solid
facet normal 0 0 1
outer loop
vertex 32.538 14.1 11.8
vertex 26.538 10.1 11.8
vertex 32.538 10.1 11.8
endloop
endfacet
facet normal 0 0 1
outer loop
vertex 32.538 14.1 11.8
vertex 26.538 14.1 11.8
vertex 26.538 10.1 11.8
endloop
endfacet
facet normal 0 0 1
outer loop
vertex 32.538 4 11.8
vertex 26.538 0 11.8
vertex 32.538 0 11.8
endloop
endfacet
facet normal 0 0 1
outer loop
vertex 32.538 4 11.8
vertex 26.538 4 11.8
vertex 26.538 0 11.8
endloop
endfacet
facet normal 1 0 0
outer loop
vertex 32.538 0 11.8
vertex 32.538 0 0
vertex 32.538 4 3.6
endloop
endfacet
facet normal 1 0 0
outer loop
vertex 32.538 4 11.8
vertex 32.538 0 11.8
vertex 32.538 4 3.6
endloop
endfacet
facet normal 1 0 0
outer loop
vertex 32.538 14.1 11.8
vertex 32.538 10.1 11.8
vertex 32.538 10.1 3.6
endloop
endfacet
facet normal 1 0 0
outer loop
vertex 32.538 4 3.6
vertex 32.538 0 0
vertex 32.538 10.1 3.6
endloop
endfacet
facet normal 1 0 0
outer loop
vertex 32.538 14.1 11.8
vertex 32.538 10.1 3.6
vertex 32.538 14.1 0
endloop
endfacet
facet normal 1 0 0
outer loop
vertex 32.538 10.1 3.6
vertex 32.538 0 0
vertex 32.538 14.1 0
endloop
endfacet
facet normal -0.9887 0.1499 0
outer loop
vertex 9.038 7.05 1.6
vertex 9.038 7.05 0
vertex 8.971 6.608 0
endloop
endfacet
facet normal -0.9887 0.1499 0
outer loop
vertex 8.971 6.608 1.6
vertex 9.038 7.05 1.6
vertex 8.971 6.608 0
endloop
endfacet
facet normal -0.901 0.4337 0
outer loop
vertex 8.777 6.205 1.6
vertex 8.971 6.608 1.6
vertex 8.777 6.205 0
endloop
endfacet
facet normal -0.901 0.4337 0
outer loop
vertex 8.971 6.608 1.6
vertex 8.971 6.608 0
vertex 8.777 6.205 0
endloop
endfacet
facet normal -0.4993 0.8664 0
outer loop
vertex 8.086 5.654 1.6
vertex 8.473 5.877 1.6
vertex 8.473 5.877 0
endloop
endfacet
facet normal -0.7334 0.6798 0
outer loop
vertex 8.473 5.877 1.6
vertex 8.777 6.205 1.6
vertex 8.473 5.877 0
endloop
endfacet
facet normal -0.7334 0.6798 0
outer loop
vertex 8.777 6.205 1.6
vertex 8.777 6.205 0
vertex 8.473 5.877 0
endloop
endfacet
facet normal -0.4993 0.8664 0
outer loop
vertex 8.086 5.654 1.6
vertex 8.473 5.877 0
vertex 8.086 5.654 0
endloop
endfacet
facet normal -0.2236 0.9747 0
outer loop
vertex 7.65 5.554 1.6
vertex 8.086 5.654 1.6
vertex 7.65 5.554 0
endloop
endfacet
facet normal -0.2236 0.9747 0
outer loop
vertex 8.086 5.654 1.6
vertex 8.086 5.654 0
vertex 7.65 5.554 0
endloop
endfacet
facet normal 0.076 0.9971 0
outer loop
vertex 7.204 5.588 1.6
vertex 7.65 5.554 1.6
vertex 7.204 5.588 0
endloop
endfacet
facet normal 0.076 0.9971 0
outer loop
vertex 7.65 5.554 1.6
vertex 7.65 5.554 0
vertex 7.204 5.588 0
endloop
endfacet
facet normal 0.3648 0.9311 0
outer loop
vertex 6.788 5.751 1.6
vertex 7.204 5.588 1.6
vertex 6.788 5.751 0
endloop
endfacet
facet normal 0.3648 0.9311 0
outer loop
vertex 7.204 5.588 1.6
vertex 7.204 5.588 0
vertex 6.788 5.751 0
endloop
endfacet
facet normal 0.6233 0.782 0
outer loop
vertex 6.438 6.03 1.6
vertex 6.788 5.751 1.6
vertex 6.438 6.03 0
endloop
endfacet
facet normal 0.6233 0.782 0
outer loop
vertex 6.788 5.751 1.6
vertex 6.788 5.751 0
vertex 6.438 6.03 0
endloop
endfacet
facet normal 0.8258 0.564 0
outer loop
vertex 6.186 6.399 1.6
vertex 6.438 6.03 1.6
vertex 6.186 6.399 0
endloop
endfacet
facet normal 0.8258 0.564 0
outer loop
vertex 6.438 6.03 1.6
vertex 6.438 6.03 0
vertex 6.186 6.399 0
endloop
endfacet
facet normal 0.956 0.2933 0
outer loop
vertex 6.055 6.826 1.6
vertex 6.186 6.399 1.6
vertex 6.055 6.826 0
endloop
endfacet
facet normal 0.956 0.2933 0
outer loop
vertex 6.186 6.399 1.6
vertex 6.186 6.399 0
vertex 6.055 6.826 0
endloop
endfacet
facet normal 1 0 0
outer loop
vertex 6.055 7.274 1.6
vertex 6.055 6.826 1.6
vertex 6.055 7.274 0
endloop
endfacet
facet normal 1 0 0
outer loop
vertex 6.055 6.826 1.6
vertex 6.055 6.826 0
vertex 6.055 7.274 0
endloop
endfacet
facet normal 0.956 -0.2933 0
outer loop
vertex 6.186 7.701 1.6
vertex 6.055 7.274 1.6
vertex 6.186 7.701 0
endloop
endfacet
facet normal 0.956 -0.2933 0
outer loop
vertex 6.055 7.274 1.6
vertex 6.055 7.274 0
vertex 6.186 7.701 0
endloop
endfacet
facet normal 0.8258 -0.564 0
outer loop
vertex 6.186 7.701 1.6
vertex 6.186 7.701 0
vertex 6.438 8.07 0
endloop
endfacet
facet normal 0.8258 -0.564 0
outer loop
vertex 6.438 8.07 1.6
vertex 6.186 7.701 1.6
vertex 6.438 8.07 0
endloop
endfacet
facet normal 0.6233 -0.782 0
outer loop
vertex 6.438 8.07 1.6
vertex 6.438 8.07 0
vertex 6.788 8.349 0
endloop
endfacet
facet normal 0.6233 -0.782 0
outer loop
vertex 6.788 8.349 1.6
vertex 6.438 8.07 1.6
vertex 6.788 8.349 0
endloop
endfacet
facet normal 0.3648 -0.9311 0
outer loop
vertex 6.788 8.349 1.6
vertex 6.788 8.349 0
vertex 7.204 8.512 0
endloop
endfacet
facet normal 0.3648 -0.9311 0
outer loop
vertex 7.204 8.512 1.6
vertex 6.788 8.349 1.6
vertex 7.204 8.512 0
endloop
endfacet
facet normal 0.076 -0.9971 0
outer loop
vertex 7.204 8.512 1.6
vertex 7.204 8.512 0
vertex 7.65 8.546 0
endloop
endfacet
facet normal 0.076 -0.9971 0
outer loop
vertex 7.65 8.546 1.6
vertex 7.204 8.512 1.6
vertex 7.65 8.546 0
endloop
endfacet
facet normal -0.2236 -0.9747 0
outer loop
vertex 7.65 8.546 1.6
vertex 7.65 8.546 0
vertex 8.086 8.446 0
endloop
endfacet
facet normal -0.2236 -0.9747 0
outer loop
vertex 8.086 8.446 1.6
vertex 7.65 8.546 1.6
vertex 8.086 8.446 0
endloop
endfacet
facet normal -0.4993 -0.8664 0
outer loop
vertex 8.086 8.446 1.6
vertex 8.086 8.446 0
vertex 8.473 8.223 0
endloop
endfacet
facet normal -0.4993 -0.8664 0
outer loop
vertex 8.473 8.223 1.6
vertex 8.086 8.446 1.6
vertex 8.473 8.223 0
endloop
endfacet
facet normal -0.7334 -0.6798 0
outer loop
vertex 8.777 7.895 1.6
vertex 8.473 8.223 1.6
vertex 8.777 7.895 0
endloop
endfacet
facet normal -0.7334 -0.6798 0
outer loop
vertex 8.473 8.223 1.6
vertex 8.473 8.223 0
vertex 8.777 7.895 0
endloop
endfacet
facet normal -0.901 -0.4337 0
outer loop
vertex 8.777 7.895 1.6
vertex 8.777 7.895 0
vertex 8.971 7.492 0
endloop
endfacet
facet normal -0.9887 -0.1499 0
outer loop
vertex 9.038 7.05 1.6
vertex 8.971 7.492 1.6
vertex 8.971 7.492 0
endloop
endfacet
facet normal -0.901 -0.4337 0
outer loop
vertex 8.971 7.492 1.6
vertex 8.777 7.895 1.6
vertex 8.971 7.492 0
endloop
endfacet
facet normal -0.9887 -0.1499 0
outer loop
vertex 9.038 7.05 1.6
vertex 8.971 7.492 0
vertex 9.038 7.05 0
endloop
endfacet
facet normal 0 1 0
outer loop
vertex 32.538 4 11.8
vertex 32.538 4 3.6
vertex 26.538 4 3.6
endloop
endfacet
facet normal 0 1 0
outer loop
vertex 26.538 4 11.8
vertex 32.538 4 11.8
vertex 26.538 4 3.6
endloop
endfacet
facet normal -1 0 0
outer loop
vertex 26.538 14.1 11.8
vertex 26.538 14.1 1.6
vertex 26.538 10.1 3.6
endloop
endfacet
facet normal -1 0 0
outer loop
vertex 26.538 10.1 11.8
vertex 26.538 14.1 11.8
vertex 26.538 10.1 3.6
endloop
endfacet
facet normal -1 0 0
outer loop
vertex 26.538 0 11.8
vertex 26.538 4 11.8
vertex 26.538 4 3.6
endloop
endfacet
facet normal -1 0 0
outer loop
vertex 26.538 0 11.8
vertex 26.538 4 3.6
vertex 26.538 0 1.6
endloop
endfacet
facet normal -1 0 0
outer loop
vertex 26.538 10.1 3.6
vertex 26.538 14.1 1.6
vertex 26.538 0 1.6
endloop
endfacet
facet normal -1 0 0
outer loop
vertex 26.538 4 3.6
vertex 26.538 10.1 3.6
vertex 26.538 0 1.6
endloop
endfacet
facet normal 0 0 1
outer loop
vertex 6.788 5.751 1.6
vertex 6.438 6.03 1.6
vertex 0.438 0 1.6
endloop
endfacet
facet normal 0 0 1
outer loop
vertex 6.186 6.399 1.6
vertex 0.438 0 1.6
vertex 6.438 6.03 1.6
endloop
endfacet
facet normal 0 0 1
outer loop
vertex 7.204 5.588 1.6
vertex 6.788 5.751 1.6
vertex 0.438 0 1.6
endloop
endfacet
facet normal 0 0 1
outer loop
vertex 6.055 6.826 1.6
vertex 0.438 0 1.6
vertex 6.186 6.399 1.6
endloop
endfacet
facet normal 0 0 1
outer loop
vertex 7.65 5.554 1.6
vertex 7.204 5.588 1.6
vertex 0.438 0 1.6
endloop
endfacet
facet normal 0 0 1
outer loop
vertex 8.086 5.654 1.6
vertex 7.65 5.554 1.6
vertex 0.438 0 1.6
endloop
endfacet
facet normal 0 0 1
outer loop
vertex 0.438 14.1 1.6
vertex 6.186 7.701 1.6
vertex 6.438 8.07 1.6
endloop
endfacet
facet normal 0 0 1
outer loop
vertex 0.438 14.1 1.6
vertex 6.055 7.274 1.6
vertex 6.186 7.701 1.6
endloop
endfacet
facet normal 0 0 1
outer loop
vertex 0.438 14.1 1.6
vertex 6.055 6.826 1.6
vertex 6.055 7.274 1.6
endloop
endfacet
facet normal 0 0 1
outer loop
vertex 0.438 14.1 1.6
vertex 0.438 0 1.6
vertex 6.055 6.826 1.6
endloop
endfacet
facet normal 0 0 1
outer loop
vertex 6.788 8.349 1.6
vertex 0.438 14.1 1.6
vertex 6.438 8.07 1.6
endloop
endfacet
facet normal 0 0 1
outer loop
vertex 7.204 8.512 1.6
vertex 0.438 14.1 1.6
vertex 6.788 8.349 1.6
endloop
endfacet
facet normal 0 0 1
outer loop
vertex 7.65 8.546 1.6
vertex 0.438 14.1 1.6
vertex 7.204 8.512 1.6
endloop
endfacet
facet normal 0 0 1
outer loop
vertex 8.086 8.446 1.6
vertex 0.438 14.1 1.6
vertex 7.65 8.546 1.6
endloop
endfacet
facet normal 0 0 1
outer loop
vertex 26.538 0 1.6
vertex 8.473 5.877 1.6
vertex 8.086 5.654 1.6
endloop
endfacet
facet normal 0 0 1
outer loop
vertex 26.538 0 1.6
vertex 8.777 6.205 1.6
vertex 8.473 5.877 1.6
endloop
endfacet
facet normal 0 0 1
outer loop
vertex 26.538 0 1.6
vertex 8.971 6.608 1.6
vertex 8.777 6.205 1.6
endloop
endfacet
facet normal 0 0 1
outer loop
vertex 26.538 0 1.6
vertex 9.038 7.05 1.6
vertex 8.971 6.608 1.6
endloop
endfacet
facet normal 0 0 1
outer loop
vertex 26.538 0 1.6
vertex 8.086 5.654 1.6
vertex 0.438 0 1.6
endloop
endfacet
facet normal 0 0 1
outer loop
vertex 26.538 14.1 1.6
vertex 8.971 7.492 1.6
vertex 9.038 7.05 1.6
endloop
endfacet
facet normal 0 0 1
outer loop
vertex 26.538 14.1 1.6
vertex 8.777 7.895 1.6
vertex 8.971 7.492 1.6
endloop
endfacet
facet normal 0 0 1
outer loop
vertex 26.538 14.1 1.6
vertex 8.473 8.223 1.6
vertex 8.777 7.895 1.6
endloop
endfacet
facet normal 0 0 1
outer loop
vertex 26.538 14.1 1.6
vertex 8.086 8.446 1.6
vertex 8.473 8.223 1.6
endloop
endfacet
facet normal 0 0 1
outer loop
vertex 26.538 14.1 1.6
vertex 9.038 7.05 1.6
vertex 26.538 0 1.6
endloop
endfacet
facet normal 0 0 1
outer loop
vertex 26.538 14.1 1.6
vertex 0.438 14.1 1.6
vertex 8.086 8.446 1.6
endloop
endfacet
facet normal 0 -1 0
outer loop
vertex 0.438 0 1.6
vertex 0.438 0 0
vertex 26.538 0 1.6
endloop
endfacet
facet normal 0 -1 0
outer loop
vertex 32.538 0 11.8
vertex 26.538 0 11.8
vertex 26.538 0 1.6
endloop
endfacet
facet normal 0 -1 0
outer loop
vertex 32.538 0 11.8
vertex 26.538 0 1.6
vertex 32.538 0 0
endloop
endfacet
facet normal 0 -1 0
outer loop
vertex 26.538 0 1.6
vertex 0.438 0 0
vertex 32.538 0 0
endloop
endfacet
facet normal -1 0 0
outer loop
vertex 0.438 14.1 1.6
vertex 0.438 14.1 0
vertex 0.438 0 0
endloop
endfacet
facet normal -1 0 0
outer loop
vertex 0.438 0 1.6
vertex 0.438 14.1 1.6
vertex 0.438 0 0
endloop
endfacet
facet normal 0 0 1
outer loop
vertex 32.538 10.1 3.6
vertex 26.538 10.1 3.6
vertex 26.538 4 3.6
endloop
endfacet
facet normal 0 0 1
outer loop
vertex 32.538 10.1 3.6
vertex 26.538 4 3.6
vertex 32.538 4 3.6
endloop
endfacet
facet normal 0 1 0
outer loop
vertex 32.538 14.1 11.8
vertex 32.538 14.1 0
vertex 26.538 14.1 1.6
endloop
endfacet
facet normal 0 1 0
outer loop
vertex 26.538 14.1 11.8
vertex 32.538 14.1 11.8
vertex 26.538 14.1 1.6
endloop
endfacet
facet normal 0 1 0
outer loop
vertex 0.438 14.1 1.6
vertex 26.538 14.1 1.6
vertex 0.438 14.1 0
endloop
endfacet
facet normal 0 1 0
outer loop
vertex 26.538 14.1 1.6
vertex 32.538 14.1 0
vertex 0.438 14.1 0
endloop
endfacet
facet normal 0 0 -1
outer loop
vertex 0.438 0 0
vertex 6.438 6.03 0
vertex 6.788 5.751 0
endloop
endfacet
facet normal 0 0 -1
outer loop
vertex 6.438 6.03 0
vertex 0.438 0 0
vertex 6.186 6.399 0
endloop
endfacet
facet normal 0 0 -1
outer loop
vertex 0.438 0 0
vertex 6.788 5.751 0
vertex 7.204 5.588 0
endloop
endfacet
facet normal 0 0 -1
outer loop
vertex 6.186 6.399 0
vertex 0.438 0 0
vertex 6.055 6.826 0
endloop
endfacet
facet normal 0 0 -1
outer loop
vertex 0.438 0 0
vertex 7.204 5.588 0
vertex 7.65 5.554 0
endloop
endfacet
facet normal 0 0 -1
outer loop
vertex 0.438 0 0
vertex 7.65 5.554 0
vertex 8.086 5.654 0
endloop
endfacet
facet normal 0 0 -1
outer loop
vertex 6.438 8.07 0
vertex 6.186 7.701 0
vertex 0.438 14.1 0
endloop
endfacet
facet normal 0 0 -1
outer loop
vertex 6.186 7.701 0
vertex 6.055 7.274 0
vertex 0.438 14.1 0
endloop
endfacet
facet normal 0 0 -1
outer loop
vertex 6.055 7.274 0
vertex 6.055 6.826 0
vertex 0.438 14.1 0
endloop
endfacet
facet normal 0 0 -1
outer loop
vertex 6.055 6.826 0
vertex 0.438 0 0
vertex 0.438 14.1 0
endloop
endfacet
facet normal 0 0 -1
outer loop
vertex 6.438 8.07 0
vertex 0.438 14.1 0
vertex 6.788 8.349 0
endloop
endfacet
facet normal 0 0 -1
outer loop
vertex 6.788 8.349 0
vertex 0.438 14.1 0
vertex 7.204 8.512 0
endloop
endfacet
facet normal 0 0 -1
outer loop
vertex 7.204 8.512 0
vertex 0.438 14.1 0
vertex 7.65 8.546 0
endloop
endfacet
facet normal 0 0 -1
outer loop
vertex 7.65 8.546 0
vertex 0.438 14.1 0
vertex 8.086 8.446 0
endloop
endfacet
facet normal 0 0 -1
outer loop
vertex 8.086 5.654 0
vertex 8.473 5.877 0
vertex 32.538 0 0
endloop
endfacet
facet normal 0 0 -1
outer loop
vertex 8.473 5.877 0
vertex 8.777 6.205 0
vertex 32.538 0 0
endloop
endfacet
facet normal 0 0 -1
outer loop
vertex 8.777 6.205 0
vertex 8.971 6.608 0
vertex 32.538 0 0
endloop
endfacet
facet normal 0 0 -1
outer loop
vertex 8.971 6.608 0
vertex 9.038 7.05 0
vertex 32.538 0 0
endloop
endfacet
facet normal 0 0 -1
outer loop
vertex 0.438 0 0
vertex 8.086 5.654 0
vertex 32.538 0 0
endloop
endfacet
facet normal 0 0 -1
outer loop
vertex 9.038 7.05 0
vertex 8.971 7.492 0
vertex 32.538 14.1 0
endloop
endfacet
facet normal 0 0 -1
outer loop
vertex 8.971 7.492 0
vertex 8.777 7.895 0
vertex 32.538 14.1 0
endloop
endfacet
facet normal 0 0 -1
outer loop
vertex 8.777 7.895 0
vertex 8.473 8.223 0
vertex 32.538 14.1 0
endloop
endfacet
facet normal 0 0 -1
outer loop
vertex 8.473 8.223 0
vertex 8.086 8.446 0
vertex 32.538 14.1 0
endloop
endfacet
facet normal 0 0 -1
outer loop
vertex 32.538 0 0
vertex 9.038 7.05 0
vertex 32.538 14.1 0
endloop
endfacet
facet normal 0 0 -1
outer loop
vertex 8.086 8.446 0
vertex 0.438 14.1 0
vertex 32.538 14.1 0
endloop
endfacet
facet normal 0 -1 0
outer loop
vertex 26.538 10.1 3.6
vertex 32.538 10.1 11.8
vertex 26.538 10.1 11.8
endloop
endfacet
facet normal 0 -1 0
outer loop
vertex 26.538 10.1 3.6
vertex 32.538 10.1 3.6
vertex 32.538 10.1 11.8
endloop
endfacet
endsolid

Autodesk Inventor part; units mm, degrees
ref_plane "YZ Plane" through (0, 0, 0) normal (1, 0, 0) x (0, 1, 0)
ref_plane "XZ Plane" through (0, 0, 0) normal (0, 1, 0) x (-1, 0, 0)
ref_plane "XY Plane" through (0, 0, 0) normal (0, 0, 1) x (1, 0, 0)
sketch "Sketch1" plane through (0, 0, 0) normal (0, 0, 1) x (1, 0, 0)
  line L0 (0.4379, 0) -> (32.5379, 0)
  line L1 (32.5379, 0) -> (32.5379, 14.1)
  line L2 (32.5379, 14.1) -> (0.4379, 14.1)
  line L3 (0.4379, 14.1) -> (0.4379, 0)
  circle A0 centre (7.5379, 7.05) radius 1.5
  point P0 (0, 0)
  dimension "d0" = 14.1
  dimension "d2" = 32.1
  dimension "d3" = 3
  dimension "d4" = 7.1
  dimension "d5" = 7.05
extrude "Extrusion1" add sketch "Sketch1" along normal blind 1.6
sketch "Sketch2" plane through (0, 0, 1.6) normal (0, 0, 1) x (1, 0, 0)
  line L0 (0.4379, 0) -> (32.5379, 0) projected
  line L1 (26.5379, 0) -> (32.5379, 0)
  line L2 (32.5379, 0) -> (32.5379, 14.1)
  line L3 (32.5379, 14.1) -> (26.5379, 14.1)
  line L4 (26.5379, 14.1) -> (26.5379, 0)
  point P0 (0, 0)
  dimension "d8" = 6
extrude "Extrusion2" add sketch "Sketch2" along normal blind 2
sketch "Sketch3" plane through (0, 0, 3.6) normal (0, 0, 1) x (1, 0, 0)
  line L0 (26.5379, 0) -> (32.5379, 0) projected
  line L1 (32.5379, 0) -> (32.5379, 14.1) projected
  line L2 (26.5379, 14.1) -> (32.5379, 14.1)
  line L3 (32.5379, 14.1) -> (32.5379, 10.1)
  line L4 (32.5379, 10.1) -> (26.5379, 10.1)
  line L5 (26.5379, 10.1) -> (26.5379, 14.1)
  line L6 (26.5379, 0) -> (32.5379, 0)
  line L7 (32.5379, 0) -> (32.5379, 4)
  line L8 (32.5379, 4) -> (26.5379, 4)
  line L9 (26.5379, 4) -> (26.5379, 0)
  point P0 (0, 0)
  dimension "d12" = 4
  dimension "d14" = 4
extrude "Extrusion3" add sketch "Sketch3" along normal blind 8.2
properties part number "optical sensor pcb"
